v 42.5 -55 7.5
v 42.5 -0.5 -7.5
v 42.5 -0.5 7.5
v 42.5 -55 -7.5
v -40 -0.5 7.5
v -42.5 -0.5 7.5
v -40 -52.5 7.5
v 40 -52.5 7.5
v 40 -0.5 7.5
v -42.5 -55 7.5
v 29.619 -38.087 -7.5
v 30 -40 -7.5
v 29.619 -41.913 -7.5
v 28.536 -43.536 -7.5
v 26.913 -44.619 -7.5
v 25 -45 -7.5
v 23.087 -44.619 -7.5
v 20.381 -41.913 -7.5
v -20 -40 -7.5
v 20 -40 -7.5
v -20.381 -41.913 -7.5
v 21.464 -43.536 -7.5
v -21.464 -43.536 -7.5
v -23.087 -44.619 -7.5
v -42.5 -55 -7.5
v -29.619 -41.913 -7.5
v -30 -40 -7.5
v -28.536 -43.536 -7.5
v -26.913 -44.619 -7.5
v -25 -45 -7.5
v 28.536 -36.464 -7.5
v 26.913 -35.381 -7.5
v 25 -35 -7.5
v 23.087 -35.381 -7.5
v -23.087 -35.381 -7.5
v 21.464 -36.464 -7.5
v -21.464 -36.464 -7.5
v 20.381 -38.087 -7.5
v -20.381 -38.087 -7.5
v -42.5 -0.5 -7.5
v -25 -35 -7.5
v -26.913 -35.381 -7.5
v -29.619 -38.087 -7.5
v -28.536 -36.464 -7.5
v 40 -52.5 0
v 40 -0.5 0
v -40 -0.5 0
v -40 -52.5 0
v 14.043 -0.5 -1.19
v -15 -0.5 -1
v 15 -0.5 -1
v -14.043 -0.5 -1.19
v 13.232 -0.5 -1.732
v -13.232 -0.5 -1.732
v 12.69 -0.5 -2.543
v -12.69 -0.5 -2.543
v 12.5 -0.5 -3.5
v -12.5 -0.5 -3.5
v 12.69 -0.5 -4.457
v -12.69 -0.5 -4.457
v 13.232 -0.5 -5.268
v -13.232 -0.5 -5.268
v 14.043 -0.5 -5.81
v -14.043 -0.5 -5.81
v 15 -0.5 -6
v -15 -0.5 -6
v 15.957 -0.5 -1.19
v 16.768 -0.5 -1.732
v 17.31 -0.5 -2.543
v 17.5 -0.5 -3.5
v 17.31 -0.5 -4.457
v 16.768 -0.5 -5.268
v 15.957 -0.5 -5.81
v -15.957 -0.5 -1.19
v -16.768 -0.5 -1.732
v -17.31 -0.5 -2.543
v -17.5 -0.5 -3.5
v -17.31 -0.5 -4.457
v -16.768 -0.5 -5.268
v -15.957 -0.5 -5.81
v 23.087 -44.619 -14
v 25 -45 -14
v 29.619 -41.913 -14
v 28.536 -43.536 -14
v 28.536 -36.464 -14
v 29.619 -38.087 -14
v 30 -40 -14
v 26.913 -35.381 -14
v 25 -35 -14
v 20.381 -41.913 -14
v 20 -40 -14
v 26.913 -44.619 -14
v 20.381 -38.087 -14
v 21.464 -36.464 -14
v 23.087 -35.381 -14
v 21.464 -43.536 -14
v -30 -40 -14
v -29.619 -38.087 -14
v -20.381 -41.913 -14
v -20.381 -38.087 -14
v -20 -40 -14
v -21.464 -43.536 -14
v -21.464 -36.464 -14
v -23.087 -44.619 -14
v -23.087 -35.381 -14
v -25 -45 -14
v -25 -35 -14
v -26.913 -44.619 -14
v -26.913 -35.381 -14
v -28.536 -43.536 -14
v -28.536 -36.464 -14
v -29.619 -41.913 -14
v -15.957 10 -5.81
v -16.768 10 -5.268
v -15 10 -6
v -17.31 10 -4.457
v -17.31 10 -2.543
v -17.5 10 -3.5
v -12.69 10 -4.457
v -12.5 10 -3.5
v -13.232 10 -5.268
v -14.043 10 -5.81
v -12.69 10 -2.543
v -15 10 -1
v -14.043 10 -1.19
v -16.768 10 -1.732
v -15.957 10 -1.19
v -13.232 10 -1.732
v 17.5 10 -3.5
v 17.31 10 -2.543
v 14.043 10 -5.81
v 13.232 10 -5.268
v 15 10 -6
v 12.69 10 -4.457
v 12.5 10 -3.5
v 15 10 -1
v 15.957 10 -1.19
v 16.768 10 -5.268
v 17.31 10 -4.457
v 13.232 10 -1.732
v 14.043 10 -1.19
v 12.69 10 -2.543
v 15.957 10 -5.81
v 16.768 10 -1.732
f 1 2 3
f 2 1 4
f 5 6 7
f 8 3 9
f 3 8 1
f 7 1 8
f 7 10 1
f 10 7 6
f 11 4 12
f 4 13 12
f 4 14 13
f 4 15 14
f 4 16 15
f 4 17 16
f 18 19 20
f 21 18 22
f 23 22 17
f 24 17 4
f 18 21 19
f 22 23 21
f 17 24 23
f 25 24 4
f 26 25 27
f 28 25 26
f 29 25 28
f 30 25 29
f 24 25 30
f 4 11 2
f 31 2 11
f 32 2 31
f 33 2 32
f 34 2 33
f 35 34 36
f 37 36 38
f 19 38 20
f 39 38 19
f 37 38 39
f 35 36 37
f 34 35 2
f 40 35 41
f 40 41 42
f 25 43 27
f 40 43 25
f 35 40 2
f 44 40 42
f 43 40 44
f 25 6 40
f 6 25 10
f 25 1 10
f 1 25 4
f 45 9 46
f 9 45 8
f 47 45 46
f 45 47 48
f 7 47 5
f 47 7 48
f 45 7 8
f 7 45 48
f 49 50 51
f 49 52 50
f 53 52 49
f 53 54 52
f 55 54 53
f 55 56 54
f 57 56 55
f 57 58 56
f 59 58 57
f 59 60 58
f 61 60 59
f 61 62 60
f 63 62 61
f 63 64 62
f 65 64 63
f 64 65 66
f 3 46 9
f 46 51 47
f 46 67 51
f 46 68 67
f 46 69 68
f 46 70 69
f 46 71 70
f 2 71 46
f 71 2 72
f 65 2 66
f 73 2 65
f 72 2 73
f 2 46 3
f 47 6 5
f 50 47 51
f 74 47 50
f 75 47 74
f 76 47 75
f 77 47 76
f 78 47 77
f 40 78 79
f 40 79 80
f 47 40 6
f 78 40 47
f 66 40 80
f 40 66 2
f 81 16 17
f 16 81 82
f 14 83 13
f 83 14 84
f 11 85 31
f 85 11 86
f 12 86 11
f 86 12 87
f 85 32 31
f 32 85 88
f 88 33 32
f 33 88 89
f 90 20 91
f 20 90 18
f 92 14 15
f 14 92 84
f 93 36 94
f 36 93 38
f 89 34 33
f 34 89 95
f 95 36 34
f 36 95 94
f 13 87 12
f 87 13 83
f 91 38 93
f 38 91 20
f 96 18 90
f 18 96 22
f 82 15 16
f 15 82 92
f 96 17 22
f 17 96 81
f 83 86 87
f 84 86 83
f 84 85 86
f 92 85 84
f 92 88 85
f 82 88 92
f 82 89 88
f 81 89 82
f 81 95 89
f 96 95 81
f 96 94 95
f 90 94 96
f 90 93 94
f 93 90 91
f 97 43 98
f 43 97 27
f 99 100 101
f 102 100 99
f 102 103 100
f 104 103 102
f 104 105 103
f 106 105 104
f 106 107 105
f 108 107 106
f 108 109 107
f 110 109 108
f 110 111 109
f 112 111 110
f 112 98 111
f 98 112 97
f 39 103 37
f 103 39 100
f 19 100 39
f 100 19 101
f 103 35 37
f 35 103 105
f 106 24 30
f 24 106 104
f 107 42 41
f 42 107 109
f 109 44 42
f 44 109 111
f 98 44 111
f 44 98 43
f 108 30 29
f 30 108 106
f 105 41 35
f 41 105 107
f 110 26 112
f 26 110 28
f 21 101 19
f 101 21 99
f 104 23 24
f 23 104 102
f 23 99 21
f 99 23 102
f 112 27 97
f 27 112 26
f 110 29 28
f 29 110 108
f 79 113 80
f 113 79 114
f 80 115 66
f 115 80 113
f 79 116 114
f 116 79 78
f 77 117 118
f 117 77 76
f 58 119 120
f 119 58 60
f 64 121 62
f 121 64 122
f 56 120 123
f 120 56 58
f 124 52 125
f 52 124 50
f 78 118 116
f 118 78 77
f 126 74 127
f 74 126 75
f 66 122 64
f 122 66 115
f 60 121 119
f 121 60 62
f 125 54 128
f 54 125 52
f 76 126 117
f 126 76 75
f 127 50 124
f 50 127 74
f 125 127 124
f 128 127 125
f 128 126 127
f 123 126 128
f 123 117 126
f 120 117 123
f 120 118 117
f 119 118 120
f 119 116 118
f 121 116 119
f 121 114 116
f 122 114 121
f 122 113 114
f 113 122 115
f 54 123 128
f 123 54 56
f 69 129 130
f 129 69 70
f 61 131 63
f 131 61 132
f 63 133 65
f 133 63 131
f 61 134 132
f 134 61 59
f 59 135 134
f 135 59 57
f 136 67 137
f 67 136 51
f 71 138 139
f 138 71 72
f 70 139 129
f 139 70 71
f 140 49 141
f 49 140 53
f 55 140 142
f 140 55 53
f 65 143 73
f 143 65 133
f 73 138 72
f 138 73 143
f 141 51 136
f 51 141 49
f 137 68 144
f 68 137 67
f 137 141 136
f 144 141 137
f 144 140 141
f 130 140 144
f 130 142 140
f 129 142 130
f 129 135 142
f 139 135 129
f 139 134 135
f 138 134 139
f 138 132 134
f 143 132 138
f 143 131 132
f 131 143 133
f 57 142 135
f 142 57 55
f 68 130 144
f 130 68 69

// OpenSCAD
module frame(){
    // frame bottom
    scale([85,110,15])
        cube([1,1,1],center = true);
}
difference(){
    difference(){
        difference(){
            // frame bottom
            scale([85,110,15])
                cube([1,1,1],center = true);
            // frame hole
            scale([80,105,10])
                translate([0,0,0.5])
                cube([1,1,1],center = true);

        }
        cube([1000,1,100],center=true);
    }
    translate([-50,0,-20])
        cube([100,60,50]);
}

//scale([1,1,1])
//    translate([25,40,-14])
//        cylinder(10,5,5);
scale([1,1,1])
    translate([25,-40,-14])
        cylinder(10,5,5);
//scale([1,1,1])
//    translate([-25,40,-14])
//        cylinder(10,5,5);
scale([1,1,1])
    translate([-25,-40,-14])
        cylinder(10,5,5);
rotate([0,90,90])
    scale([0.5,0.5,2])
        translate([7,30,-5])
            cylinder(10,5,5);
rotate([0,90,90])
    scale([0.5,0.5,2])
        translate([7,-30,-5])
            cylinder(10,5,5);
